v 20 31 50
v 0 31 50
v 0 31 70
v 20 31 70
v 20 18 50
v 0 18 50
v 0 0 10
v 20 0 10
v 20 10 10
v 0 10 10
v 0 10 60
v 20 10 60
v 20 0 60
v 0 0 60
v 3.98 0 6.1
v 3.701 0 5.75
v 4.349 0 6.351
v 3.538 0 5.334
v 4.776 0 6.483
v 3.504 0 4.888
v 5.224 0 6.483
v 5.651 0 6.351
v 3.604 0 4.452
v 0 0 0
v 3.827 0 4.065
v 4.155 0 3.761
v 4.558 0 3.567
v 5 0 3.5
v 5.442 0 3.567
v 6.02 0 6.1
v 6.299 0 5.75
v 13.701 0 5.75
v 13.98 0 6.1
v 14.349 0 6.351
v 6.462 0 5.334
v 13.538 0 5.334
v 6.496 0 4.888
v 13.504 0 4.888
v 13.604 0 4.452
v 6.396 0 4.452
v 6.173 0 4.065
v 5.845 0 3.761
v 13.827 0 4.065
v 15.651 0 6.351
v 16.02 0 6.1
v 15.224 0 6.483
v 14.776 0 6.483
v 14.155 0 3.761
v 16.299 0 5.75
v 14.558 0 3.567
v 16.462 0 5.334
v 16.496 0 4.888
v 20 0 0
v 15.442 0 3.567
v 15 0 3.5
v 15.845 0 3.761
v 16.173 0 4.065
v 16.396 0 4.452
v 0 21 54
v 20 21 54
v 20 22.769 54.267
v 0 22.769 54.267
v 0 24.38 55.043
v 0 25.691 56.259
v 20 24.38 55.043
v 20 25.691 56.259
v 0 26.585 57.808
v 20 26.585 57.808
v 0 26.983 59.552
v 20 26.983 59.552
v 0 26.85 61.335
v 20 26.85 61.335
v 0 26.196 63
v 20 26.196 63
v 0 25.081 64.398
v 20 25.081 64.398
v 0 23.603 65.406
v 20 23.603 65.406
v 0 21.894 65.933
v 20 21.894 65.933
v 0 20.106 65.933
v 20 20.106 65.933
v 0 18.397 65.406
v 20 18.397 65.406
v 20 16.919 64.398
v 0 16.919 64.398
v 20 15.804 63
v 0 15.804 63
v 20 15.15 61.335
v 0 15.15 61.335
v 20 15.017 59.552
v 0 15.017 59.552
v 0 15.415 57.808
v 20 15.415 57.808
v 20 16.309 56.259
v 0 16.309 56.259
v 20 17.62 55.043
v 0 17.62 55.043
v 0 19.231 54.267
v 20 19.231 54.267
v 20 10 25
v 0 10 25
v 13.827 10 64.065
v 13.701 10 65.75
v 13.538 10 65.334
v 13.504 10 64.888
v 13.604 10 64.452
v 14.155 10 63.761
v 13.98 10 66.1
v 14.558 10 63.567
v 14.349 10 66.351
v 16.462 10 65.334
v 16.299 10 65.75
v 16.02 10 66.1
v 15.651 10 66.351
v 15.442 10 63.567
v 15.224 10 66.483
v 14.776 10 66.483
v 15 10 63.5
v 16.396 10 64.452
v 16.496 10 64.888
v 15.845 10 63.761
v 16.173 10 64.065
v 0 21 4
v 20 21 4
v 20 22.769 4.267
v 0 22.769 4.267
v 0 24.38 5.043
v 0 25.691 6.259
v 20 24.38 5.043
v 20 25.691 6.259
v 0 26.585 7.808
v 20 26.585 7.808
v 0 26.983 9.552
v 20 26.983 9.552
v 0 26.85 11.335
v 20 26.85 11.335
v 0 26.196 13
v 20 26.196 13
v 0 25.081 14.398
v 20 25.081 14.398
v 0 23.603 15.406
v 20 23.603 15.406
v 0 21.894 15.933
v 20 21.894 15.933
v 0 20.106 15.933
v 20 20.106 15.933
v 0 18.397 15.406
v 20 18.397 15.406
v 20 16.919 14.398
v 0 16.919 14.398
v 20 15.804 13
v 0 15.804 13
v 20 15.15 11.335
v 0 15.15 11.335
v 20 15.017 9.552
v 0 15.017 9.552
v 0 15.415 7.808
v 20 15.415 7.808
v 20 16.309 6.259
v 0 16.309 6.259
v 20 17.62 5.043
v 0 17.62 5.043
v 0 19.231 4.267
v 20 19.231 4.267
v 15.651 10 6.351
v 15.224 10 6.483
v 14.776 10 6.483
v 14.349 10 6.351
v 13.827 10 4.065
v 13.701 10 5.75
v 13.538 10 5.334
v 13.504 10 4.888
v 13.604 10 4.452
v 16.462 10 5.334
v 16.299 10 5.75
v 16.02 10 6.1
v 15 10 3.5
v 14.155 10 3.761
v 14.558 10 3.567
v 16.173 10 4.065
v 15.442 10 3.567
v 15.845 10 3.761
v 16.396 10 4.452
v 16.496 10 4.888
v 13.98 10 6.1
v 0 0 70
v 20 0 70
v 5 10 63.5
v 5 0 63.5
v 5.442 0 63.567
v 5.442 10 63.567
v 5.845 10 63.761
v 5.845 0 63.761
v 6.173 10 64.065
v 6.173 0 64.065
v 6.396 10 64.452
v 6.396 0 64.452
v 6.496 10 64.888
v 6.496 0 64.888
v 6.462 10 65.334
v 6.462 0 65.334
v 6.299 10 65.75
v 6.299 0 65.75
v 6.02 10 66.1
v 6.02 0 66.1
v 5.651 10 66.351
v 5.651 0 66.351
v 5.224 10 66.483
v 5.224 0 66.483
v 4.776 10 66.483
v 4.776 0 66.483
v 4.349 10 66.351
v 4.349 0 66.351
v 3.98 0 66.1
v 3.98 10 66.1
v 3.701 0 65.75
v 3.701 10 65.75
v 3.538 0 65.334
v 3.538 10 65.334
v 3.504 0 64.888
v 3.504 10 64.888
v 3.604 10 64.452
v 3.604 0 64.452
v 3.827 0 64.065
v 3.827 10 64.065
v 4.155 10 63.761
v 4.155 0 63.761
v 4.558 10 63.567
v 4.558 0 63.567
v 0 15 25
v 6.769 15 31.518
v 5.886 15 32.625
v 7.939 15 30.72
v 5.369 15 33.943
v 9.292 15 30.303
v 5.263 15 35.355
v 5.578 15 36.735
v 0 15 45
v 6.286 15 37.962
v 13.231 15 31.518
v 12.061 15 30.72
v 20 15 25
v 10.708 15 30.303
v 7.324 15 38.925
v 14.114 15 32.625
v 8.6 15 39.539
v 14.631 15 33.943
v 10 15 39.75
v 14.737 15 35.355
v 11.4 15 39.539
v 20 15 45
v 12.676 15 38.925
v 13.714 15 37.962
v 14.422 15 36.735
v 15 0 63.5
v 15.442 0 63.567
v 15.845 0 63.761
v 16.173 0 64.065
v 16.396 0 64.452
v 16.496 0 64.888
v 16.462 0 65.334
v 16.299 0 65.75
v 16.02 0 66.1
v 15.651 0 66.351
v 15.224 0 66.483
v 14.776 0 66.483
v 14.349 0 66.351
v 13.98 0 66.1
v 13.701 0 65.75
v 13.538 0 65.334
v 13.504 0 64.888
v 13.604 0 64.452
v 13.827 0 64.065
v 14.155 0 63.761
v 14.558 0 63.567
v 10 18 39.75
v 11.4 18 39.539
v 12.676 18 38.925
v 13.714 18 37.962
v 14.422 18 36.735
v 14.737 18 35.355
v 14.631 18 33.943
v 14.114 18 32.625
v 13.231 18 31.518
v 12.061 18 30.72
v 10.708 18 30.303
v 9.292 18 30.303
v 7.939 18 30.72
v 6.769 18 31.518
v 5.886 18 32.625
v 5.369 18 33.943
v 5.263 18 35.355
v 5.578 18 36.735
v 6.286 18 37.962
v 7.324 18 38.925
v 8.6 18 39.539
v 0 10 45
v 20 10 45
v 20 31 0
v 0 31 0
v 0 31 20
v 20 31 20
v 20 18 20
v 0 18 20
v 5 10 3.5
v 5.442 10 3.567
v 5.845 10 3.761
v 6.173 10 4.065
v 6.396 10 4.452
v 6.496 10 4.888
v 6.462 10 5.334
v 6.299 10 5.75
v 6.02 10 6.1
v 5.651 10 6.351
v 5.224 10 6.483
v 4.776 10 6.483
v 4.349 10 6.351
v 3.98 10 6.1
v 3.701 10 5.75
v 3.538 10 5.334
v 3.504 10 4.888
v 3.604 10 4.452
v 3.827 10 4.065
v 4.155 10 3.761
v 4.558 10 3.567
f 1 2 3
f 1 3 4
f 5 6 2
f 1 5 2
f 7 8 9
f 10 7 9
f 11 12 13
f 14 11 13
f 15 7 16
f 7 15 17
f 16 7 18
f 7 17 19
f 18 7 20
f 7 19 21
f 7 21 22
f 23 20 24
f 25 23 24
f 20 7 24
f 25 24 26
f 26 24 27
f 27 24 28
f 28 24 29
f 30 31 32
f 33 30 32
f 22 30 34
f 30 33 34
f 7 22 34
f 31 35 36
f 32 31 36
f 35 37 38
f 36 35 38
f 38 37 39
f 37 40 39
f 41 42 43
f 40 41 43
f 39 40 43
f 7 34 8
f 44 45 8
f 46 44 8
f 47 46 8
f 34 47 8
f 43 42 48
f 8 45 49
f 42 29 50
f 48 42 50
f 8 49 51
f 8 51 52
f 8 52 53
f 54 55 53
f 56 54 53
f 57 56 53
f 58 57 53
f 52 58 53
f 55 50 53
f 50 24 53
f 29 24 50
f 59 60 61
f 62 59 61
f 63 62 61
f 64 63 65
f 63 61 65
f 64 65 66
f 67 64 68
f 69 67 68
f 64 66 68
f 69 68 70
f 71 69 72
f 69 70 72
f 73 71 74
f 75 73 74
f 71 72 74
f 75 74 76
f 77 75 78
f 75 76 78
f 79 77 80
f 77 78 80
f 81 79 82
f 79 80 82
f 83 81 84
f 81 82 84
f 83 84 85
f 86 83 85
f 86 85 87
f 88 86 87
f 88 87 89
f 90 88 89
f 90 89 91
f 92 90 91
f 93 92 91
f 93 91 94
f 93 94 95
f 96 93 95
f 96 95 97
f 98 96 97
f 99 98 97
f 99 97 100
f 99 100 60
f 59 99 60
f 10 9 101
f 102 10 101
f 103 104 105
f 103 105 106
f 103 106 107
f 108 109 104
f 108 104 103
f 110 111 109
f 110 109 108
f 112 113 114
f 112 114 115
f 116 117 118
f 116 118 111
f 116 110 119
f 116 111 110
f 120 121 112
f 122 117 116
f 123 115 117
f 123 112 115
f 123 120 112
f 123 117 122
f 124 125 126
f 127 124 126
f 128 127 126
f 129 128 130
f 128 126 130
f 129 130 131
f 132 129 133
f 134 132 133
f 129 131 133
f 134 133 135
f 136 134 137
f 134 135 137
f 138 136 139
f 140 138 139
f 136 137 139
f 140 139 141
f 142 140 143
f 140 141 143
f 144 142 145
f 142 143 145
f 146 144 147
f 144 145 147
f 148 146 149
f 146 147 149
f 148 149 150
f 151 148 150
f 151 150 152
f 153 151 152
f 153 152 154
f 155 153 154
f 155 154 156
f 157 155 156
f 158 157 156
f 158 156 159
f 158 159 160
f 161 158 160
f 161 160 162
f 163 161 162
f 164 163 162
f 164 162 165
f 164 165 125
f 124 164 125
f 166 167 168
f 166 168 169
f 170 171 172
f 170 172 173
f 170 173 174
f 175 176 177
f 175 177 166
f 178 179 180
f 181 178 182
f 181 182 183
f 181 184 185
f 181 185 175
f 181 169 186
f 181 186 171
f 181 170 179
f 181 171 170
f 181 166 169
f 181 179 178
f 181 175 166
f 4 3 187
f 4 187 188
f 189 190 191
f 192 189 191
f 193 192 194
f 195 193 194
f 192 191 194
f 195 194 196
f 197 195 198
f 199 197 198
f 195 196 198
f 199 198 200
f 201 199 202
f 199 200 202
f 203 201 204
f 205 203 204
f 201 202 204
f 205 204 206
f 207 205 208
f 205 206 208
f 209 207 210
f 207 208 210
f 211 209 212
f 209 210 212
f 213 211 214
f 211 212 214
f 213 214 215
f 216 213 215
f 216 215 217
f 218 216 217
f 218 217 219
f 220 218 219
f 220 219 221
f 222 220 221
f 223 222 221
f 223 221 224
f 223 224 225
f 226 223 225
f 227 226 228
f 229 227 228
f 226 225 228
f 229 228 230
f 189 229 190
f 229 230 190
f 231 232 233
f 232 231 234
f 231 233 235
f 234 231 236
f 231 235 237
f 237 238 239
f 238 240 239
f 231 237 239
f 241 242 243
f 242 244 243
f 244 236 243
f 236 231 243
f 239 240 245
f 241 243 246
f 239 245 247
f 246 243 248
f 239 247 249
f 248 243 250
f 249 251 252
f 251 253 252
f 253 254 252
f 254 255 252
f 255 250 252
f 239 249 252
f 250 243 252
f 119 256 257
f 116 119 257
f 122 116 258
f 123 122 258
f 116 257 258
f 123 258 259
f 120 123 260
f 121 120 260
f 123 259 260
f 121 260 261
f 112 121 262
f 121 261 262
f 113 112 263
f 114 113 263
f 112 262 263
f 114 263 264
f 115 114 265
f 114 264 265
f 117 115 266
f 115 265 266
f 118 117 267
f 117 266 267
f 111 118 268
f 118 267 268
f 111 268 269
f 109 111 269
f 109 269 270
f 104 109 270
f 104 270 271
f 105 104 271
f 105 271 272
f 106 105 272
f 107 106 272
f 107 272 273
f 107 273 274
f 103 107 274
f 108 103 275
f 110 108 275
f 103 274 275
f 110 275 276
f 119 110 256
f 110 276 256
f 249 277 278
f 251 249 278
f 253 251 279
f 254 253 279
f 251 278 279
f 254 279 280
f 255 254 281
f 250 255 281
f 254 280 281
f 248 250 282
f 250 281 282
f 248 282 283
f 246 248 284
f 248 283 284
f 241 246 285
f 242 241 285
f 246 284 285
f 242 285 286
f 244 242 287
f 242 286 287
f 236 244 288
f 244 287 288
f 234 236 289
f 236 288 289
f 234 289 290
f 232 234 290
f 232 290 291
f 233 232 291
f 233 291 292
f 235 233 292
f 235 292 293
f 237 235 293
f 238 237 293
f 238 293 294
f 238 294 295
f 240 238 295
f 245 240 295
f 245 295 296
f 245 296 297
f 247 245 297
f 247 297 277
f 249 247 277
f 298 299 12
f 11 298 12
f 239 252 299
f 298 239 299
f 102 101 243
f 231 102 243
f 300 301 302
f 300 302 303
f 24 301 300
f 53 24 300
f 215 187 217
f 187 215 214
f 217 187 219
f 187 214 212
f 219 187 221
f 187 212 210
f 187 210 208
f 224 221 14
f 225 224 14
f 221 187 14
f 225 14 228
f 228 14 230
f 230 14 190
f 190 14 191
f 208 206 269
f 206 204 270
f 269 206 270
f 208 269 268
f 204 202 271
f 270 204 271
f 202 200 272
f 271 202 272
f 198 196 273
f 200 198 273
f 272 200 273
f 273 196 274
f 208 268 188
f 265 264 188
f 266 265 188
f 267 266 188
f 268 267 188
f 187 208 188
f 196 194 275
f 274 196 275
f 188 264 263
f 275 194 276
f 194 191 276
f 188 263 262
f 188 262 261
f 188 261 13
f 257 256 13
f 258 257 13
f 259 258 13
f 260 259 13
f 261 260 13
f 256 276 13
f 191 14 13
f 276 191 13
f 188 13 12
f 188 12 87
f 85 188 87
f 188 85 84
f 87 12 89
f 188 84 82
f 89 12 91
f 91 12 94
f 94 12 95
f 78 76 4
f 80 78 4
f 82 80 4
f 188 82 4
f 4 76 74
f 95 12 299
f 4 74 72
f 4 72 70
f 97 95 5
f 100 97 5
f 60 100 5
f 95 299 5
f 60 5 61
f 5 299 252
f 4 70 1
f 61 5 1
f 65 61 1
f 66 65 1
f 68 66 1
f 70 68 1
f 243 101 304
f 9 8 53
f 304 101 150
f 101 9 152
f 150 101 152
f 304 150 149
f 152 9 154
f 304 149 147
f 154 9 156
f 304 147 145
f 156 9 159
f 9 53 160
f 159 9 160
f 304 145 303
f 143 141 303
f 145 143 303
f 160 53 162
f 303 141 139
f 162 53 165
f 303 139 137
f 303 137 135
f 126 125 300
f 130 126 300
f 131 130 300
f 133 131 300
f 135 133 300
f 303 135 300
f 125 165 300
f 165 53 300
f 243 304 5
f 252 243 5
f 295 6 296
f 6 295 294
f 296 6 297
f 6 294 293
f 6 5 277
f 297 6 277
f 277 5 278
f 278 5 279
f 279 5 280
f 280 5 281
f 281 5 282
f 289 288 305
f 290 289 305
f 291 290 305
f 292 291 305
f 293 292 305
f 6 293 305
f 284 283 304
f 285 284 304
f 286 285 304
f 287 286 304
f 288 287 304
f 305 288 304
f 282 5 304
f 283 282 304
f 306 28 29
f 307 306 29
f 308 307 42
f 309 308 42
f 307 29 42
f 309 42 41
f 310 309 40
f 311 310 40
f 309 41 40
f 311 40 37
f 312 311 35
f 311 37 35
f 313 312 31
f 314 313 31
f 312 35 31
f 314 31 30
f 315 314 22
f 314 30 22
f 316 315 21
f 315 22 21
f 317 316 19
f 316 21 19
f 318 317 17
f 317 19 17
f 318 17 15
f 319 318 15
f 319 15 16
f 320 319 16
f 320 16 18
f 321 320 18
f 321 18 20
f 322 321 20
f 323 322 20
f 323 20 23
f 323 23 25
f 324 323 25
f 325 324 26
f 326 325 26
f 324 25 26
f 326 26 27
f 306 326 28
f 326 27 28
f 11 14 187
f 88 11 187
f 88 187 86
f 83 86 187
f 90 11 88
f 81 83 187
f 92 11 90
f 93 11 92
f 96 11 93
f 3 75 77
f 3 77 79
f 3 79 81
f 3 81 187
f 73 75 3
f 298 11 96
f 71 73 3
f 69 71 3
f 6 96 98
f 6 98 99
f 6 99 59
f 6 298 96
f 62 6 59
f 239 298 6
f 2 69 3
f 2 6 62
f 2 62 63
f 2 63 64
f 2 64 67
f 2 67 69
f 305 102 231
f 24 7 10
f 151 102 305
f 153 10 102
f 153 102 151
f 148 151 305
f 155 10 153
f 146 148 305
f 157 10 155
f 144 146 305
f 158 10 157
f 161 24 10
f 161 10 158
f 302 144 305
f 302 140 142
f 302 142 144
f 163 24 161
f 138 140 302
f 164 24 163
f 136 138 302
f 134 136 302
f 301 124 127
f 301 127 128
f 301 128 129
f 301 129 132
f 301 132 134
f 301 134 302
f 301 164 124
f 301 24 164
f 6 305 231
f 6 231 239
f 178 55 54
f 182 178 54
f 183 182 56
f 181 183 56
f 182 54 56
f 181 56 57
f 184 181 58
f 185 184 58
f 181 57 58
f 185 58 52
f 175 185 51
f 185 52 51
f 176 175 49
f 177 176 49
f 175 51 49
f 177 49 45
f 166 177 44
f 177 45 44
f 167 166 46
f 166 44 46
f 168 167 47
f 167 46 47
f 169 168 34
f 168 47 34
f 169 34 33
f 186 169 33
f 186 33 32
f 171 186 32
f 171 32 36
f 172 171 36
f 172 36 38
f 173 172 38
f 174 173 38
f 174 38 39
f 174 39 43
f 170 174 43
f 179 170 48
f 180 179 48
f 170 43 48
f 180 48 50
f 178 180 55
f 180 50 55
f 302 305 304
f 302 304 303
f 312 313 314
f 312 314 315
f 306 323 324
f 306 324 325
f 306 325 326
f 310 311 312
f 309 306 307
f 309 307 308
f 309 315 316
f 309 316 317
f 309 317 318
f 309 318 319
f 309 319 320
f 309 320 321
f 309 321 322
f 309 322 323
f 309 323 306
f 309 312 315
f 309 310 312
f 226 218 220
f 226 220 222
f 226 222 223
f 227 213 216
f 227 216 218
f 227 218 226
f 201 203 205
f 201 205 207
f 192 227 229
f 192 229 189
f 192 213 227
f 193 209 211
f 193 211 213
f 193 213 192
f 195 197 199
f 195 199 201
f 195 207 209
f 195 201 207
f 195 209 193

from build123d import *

# Parameters (mm, degrees)
ESQUISSE1_W             = 20
ESQUISSE1_H             = 31
EXTRUSION1_DEPTH        = 70
ESQUISSE2_W             = 30
ESQUISSE2_H             = 13
EXTRUSION2_DEPTH        = 80.126481029
ESQUISSE3_R             = 4.75
EXTRUSION3_DEPTH        = 75.993333037
ESQUISSE4_R             = 6
EXTRUSION4_DEPTH        = 80.126481029
ESQUISSE5_R             = 1.5
ENL_V_MAT_EXTRU_1_DEPTH = 10


with BuildPart() as part:
    # Esquisse1 → Extrusion1 (new body)
    with BuildSketch(Plane.XY):
        with Locations((10, 15.5)):
            Rectangle(ESQUISSE1_W, ESQUISSE1_H)
    extrude(amount=EXTRUSION1_DEPTH)

    # Esquisse2 → Extrusion2 (cut, through all)
    with BuildSketch(Plane(origin=(20, 0, 0), x_dir=(0, 0, -1), z_dir=(1, 0, 0))):
        with Locations((-35, 24.5)):
            Rectangle(ESQUISSE2_W, ESQUISSE2_H)
        Polygon((-45, 10), (-60, 10), (-60, 0), (-10, 0), (-10, 10), (-25, 10), (-25, 15), (-45, 15), align=None)
    extrude(amount=-EXTRUSION2_DEPTH, mode=Mode.SUBTRACT)

    # Esquisse3 → Extrusion3 (cut, through all)
    with BuildSketch(Plane(origin=(0, 18, 0), x_dir=(1, 0, 0), z_dir=(0, 1, 0))):
        with Locations(Location((10, -35, 0), (0, 0, 270))):
            Circle(ESQUISSE3_R)
    extrude(amount=-EXTRUSION3_DEPTH, mode=Mode.SUBTRACT)

    # Esquisse4 → Extrusion4 (cut, through all)
    with BuildSketch(Plane(origin=(20, 0, 0), x_dir=(0, 0, -1), z_dir=(1, 0, 0))):
        with Locations((-60, 21)):
            Circle(ESQUISSE4_R)
        with Locations((-10, 21)):
            Circle(ESQUISSE4_R)
    extrude(amount=-EXTRUSION4_DEPTH, mode=Mode.SUBTRACT)

    # Esquisse5 → Enlèv. mat.-Extru.1 (cut)
    with BuildSketch(Plane.XZ):
        with Locations(Location((5, 65, 0), (0, 0, 270))):
            Circle(ESQUISSE5_R)
        with Locations(Location((5, 5, 0), (0, 0, 270))):
            Circle(ESQUISSE5_R)
        with Locations(Location((15, 65, 0), (0, 0, 270))):
            Circle(ESQUISSE5_R)
        with Locations(Location((15, 5, 0), (0, 0, 270))):
            Circle(ESQUISSE5_R)
    extrude(amount=-ENL_V_MAT_EXTRU_1_DEPTH, mode=Mode.SUBTRACT)


solid = part.part
